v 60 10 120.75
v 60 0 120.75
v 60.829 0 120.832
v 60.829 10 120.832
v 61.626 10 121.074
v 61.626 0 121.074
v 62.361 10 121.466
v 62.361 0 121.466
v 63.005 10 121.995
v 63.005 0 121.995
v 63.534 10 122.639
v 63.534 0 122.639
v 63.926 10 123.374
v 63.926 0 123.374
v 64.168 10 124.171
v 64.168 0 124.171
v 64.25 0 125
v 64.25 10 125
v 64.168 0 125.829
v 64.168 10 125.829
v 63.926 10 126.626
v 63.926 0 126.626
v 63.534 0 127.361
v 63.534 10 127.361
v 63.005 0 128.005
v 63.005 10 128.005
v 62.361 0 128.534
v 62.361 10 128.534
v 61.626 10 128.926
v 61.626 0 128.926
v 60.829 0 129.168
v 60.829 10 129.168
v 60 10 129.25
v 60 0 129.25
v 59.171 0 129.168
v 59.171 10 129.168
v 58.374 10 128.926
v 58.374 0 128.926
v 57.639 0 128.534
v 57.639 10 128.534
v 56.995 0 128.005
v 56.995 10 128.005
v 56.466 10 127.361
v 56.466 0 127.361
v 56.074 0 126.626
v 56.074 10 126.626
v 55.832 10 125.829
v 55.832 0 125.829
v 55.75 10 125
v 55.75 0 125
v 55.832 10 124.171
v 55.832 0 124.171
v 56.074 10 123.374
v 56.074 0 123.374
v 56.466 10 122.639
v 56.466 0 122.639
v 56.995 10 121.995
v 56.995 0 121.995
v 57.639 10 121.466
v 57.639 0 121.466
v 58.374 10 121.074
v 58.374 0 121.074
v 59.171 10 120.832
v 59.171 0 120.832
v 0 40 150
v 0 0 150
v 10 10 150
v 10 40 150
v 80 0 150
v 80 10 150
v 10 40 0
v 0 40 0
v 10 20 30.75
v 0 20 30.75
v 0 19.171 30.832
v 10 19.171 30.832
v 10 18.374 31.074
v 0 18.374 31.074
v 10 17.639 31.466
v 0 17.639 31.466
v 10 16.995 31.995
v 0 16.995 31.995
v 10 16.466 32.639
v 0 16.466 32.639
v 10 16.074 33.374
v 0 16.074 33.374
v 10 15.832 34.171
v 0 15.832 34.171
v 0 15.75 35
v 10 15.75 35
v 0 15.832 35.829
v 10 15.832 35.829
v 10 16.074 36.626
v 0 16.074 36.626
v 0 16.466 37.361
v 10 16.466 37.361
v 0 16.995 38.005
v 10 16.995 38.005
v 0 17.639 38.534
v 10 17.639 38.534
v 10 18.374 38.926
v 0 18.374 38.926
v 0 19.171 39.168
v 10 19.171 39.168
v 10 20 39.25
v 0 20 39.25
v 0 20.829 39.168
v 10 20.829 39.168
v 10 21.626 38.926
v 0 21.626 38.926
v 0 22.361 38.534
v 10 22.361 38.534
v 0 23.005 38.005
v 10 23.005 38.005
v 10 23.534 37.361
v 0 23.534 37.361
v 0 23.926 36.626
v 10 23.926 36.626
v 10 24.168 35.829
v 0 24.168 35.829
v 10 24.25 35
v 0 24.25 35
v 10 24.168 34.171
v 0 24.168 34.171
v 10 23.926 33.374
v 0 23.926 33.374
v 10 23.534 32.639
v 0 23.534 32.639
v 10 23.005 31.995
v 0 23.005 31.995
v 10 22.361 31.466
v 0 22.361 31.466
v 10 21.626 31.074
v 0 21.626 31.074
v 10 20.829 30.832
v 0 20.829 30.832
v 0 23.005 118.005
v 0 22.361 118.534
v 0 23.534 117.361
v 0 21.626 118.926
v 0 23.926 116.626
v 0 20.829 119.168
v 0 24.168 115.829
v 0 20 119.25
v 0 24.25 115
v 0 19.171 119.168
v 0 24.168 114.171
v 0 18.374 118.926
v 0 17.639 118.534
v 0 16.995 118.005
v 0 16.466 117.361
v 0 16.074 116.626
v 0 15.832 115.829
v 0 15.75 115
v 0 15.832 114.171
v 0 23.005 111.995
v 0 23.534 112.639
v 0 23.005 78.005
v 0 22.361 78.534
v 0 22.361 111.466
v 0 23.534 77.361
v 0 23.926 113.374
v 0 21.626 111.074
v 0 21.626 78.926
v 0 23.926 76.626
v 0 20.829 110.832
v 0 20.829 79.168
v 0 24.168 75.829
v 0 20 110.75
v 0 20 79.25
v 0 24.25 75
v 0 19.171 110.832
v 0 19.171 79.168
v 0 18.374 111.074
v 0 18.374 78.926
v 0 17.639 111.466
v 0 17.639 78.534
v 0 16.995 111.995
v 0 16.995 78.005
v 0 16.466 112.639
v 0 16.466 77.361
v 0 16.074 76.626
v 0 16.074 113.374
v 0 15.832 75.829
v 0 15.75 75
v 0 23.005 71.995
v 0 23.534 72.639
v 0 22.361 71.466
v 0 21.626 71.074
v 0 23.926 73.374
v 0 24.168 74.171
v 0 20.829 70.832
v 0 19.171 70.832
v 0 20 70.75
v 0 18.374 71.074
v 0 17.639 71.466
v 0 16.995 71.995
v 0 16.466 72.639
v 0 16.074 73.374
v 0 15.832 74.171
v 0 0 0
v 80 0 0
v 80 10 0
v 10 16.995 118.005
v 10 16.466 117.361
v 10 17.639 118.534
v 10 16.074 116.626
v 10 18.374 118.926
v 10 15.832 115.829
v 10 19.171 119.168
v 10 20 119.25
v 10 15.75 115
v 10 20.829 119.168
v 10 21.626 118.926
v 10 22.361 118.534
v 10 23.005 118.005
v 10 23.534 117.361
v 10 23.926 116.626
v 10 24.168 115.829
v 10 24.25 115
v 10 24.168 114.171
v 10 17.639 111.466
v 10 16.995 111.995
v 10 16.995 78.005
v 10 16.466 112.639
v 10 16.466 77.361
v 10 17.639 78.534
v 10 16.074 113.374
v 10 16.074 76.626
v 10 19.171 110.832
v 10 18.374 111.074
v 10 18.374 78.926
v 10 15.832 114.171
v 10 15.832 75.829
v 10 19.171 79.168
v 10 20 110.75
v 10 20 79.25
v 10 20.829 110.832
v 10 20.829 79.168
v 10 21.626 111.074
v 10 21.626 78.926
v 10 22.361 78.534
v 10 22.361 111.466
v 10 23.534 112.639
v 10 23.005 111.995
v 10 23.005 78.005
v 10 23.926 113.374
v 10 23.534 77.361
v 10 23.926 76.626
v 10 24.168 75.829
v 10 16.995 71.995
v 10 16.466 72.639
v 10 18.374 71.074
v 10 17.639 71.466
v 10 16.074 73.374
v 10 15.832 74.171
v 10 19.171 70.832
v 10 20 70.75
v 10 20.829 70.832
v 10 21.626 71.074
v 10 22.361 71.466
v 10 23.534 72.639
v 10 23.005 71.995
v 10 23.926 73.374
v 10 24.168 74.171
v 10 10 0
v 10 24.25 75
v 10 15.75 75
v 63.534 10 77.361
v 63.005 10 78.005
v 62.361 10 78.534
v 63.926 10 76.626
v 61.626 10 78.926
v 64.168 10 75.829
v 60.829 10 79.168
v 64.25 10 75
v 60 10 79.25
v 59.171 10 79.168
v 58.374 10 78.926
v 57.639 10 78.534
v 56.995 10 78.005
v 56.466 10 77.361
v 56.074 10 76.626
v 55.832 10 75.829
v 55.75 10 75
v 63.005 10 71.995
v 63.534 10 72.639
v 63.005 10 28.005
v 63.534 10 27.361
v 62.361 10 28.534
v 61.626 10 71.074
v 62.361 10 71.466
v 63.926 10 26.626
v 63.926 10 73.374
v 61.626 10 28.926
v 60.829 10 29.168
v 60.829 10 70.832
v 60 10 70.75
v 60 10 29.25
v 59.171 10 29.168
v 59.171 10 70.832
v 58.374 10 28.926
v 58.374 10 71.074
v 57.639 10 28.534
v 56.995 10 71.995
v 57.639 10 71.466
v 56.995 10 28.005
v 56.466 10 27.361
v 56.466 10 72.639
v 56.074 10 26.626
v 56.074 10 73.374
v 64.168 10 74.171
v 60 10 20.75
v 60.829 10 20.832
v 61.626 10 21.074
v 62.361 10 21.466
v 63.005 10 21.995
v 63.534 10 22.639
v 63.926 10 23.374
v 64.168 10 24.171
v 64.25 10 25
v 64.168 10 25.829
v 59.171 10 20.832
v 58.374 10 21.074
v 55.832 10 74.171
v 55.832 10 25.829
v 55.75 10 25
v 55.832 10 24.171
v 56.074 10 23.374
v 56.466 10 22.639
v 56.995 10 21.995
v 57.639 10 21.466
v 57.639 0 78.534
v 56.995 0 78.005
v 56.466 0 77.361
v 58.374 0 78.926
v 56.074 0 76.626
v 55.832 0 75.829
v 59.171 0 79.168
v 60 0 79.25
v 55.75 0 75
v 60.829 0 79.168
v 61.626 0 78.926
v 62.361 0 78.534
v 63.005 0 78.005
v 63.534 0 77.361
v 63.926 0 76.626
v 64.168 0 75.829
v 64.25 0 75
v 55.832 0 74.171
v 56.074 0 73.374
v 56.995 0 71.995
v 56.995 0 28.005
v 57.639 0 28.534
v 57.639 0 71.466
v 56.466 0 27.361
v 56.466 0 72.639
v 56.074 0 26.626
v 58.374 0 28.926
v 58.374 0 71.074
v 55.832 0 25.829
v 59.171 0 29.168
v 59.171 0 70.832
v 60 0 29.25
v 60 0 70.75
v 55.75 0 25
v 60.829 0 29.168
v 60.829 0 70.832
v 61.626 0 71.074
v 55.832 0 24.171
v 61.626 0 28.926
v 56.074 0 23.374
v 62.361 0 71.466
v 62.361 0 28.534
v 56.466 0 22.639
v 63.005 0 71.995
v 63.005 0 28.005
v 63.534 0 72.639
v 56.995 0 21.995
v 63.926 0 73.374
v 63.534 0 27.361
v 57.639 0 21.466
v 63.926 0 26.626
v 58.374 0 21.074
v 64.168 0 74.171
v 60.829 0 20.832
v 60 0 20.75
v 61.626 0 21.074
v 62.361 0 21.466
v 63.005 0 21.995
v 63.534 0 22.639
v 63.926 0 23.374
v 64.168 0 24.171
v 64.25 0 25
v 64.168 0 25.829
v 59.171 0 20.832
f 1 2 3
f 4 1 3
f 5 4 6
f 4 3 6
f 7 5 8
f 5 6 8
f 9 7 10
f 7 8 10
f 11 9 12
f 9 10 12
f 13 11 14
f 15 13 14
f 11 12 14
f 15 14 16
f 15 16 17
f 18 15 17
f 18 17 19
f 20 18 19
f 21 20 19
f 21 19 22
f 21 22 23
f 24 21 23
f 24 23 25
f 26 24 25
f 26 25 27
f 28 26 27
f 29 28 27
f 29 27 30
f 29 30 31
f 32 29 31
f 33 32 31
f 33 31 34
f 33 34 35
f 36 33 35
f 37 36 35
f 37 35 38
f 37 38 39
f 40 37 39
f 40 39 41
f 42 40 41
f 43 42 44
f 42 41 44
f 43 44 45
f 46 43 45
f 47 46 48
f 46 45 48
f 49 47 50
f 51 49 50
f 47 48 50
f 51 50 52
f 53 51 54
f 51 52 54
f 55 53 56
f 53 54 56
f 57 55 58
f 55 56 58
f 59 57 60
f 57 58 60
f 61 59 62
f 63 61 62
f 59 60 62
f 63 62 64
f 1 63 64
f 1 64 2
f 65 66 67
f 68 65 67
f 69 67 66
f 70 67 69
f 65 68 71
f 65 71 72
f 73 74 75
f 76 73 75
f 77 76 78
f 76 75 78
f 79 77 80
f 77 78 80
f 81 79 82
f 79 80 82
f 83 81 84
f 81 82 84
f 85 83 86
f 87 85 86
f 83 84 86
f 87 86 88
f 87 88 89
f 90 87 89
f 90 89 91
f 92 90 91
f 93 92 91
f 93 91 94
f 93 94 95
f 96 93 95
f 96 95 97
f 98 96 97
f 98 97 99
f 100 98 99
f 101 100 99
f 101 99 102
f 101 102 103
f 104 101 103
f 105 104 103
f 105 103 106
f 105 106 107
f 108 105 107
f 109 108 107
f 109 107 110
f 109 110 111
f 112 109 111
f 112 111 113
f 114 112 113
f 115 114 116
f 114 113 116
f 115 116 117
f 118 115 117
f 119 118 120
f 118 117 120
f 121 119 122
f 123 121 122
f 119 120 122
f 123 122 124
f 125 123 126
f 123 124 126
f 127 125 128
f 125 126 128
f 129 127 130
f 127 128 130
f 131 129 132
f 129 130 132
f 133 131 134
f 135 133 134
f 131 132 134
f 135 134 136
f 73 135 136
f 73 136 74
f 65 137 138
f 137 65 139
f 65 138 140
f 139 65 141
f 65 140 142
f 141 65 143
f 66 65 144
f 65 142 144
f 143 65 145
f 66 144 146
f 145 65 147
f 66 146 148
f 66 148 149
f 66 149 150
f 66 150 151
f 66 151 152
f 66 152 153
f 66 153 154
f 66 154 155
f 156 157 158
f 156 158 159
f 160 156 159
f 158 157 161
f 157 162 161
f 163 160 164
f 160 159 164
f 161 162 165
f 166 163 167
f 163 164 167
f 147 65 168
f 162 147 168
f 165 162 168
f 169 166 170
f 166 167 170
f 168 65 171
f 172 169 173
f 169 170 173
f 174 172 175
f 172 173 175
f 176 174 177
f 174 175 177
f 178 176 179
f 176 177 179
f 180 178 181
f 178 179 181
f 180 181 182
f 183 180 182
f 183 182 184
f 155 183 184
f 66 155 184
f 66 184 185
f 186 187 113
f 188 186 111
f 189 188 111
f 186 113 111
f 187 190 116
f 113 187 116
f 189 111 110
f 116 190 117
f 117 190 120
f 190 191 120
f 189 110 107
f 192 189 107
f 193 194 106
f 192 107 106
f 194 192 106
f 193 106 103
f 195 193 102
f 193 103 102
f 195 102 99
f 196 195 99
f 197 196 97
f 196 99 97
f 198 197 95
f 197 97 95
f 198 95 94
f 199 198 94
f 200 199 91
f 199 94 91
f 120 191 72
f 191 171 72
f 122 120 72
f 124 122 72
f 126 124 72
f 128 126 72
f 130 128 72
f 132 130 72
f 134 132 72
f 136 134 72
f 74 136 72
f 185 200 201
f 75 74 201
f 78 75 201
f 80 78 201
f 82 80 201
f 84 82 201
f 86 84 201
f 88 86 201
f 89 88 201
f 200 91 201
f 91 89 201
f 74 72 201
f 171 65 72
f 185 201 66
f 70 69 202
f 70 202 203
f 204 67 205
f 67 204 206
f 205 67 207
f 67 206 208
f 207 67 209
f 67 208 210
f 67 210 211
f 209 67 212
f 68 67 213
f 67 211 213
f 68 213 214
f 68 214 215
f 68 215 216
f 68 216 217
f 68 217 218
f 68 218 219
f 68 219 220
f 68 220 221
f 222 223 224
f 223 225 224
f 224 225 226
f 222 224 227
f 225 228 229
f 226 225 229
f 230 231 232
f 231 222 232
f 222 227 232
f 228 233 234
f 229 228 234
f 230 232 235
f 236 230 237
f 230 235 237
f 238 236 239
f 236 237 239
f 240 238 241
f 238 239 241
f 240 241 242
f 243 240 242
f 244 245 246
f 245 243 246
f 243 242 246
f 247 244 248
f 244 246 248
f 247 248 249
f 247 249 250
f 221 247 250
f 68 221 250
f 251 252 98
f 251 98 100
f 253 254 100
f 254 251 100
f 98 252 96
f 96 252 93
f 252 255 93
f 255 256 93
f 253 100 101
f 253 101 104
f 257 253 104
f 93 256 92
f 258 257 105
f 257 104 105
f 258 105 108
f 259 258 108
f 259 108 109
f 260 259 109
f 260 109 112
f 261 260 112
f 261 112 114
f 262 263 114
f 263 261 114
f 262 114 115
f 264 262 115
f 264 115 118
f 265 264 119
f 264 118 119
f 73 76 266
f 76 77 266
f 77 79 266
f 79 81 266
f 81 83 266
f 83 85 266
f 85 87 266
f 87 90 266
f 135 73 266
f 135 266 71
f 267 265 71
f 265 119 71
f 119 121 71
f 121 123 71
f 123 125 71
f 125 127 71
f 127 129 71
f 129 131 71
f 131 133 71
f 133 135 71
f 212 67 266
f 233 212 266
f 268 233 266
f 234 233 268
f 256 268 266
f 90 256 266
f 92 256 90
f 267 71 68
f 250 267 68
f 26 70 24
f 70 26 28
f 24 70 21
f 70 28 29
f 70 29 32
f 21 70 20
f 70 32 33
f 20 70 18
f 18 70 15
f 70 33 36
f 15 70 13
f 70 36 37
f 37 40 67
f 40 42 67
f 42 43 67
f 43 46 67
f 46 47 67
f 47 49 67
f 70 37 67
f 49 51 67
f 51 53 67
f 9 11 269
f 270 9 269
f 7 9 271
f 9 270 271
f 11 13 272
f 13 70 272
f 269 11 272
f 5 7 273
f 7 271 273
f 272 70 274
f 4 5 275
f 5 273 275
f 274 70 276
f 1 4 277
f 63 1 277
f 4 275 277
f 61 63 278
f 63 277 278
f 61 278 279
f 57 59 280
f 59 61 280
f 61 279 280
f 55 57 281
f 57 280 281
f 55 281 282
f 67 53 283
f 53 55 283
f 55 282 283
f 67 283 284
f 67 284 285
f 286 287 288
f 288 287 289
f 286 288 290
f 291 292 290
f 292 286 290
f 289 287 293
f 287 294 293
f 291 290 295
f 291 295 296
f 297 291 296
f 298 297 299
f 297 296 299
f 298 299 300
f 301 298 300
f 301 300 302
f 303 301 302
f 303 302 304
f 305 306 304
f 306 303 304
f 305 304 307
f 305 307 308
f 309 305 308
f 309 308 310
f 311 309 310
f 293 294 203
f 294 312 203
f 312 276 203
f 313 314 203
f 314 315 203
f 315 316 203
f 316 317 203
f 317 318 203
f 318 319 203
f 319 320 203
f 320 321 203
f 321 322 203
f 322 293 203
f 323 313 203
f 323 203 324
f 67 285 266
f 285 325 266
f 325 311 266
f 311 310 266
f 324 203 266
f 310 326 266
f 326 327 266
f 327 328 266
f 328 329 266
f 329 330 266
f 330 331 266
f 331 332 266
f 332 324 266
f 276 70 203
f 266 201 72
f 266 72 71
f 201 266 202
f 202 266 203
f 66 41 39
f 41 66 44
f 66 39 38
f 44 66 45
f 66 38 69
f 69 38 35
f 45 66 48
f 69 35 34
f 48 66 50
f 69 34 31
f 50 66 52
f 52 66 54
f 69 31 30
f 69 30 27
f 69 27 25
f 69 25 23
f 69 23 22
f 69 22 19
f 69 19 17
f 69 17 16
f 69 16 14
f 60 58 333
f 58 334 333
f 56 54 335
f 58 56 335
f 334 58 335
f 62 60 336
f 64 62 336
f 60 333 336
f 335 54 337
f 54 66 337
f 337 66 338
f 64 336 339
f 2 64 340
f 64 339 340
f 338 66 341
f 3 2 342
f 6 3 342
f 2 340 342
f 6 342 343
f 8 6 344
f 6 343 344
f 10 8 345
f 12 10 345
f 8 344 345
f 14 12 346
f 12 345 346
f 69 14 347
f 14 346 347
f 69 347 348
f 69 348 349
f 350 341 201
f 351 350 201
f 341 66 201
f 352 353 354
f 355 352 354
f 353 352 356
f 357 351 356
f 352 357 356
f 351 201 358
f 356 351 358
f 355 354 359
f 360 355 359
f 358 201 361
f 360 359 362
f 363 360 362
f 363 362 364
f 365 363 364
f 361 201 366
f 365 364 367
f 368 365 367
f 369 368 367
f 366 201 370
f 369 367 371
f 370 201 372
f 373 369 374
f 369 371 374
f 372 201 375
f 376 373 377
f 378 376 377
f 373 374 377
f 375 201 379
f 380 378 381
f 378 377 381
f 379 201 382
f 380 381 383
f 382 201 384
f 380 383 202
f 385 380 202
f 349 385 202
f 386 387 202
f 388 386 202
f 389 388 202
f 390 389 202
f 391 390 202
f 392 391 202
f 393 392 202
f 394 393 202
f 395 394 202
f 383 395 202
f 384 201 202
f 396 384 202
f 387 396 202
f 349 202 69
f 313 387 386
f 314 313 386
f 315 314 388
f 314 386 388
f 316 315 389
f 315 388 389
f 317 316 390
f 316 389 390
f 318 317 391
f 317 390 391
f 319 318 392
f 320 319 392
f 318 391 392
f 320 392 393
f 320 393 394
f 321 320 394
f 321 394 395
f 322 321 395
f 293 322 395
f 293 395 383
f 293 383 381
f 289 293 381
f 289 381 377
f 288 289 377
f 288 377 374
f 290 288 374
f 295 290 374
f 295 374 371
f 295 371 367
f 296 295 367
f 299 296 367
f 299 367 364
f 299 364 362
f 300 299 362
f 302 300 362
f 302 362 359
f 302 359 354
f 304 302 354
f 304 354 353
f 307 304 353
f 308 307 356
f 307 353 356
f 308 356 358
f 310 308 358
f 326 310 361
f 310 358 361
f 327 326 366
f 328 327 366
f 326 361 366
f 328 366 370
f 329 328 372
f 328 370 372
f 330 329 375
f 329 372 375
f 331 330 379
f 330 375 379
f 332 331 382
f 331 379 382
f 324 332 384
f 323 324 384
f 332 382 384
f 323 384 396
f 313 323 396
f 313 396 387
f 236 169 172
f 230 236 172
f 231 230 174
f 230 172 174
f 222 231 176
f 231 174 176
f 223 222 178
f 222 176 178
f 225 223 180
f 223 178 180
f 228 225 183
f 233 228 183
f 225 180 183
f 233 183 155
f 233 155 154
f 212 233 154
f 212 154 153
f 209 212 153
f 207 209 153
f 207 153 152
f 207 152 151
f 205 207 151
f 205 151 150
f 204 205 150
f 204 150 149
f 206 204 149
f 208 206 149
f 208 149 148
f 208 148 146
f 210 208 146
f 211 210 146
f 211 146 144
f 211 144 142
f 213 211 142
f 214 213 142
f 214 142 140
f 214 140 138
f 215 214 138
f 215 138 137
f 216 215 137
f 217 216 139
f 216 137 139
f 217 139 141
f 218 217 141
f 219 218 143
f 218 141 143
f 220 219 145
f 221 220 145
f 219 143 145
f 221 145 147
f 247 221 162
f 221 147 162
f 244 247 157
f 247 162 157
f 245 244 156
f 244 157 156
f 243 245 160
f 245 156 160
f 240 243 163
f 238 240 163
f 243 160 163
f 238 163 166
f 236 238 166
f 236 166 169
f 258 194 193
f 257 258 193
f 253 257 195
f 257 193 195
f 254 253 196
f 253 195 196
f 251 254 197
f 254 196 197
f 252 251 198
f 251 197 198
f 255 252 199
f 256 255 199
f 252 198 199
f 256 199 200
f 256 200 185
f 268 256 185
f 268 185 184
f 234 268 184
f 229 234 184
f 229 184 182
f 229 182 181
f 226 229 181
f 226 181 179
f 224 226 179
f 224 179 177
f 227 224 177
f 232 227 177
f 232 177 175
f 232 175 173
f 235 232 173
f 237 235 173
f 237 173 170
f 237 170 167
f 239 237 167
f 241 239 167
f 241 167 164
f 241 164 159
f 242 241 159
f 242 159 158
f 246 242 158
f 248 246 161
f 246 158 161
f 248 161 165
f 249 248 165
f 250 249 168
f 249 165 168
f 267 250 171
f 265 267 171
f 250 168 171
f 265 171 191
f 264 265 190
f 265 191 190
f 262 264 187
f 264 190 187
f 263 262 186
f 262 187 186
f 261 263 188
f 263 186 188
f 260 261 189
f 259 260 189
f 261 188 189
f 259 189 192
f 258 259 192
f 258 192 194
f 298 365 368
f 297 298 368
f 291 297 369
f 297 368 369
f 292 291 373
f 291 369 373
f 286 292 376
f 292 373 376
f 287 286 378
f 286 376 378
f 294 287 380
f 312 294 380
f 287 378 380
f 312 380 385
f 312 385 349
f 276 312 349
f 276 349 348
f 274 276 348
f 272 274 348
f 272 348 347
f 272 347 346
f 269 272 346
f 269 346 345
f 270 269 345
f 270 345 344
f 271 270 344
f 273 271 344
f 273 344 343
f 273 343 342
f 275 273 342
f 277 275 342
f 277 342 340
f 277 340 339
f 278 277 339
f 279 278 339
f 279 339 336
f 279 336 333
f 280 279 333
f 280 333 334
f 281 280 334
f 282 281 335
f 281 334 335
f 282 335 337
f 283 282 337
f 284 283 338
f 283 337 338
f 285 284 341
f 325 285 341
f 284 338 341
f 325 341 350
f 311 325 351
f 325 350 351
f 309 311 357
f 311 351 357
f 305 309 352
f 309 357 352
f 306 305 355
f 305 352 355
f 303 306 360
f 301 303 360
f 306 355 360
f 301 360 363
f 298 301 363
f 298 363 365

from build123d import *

# Parameters (mm, degrees)
EXTRUDE_1_DEPTH                   = 150
HOLE_WIZARD_8_5_8_5_1_D           = 8.5
HOLE_WIZARD_8_5_8_5_1_ON_FACE_2_D = 8.5


with BuildPart() as part:
    # 草图1 → 凸台-拉伸1 (new body)
    with BuildSketch(Plane.XY):
        Polygon((0, 40), (0, 0), (80, 0), (80, 10), (10, 10), (10, 40), align=None)
    extrude(amount=EXTRUDE_1_DEPTH)

    # Ø8.5 (8.5) 直径孔1 (through all)
    with Locations(Plane(origin=(10, 20, 115), x_dir=(0, 0, 1), z_dir=(1, 0, 0))):
        with Locations((0, 0), (-80, 0), (-40, 0)):
            Hole(HOLE_WIZARD_8_5_8_5_1_D / 2)

    # Ø8.5 (8.5) 直径孔1 on face 2 (through all)
    with Locations(Plane(origin=(60, 10, 125), x_dir=(0, 0, 1), z_dir=(0, 1, 0))):
        with Locations((0, 0), (-100, 0), (-50, 0)):
            Hole(HOLE_WIZARD_8_5_8_5_1_ON_FACE_2_D / 2)


solid = part.part
